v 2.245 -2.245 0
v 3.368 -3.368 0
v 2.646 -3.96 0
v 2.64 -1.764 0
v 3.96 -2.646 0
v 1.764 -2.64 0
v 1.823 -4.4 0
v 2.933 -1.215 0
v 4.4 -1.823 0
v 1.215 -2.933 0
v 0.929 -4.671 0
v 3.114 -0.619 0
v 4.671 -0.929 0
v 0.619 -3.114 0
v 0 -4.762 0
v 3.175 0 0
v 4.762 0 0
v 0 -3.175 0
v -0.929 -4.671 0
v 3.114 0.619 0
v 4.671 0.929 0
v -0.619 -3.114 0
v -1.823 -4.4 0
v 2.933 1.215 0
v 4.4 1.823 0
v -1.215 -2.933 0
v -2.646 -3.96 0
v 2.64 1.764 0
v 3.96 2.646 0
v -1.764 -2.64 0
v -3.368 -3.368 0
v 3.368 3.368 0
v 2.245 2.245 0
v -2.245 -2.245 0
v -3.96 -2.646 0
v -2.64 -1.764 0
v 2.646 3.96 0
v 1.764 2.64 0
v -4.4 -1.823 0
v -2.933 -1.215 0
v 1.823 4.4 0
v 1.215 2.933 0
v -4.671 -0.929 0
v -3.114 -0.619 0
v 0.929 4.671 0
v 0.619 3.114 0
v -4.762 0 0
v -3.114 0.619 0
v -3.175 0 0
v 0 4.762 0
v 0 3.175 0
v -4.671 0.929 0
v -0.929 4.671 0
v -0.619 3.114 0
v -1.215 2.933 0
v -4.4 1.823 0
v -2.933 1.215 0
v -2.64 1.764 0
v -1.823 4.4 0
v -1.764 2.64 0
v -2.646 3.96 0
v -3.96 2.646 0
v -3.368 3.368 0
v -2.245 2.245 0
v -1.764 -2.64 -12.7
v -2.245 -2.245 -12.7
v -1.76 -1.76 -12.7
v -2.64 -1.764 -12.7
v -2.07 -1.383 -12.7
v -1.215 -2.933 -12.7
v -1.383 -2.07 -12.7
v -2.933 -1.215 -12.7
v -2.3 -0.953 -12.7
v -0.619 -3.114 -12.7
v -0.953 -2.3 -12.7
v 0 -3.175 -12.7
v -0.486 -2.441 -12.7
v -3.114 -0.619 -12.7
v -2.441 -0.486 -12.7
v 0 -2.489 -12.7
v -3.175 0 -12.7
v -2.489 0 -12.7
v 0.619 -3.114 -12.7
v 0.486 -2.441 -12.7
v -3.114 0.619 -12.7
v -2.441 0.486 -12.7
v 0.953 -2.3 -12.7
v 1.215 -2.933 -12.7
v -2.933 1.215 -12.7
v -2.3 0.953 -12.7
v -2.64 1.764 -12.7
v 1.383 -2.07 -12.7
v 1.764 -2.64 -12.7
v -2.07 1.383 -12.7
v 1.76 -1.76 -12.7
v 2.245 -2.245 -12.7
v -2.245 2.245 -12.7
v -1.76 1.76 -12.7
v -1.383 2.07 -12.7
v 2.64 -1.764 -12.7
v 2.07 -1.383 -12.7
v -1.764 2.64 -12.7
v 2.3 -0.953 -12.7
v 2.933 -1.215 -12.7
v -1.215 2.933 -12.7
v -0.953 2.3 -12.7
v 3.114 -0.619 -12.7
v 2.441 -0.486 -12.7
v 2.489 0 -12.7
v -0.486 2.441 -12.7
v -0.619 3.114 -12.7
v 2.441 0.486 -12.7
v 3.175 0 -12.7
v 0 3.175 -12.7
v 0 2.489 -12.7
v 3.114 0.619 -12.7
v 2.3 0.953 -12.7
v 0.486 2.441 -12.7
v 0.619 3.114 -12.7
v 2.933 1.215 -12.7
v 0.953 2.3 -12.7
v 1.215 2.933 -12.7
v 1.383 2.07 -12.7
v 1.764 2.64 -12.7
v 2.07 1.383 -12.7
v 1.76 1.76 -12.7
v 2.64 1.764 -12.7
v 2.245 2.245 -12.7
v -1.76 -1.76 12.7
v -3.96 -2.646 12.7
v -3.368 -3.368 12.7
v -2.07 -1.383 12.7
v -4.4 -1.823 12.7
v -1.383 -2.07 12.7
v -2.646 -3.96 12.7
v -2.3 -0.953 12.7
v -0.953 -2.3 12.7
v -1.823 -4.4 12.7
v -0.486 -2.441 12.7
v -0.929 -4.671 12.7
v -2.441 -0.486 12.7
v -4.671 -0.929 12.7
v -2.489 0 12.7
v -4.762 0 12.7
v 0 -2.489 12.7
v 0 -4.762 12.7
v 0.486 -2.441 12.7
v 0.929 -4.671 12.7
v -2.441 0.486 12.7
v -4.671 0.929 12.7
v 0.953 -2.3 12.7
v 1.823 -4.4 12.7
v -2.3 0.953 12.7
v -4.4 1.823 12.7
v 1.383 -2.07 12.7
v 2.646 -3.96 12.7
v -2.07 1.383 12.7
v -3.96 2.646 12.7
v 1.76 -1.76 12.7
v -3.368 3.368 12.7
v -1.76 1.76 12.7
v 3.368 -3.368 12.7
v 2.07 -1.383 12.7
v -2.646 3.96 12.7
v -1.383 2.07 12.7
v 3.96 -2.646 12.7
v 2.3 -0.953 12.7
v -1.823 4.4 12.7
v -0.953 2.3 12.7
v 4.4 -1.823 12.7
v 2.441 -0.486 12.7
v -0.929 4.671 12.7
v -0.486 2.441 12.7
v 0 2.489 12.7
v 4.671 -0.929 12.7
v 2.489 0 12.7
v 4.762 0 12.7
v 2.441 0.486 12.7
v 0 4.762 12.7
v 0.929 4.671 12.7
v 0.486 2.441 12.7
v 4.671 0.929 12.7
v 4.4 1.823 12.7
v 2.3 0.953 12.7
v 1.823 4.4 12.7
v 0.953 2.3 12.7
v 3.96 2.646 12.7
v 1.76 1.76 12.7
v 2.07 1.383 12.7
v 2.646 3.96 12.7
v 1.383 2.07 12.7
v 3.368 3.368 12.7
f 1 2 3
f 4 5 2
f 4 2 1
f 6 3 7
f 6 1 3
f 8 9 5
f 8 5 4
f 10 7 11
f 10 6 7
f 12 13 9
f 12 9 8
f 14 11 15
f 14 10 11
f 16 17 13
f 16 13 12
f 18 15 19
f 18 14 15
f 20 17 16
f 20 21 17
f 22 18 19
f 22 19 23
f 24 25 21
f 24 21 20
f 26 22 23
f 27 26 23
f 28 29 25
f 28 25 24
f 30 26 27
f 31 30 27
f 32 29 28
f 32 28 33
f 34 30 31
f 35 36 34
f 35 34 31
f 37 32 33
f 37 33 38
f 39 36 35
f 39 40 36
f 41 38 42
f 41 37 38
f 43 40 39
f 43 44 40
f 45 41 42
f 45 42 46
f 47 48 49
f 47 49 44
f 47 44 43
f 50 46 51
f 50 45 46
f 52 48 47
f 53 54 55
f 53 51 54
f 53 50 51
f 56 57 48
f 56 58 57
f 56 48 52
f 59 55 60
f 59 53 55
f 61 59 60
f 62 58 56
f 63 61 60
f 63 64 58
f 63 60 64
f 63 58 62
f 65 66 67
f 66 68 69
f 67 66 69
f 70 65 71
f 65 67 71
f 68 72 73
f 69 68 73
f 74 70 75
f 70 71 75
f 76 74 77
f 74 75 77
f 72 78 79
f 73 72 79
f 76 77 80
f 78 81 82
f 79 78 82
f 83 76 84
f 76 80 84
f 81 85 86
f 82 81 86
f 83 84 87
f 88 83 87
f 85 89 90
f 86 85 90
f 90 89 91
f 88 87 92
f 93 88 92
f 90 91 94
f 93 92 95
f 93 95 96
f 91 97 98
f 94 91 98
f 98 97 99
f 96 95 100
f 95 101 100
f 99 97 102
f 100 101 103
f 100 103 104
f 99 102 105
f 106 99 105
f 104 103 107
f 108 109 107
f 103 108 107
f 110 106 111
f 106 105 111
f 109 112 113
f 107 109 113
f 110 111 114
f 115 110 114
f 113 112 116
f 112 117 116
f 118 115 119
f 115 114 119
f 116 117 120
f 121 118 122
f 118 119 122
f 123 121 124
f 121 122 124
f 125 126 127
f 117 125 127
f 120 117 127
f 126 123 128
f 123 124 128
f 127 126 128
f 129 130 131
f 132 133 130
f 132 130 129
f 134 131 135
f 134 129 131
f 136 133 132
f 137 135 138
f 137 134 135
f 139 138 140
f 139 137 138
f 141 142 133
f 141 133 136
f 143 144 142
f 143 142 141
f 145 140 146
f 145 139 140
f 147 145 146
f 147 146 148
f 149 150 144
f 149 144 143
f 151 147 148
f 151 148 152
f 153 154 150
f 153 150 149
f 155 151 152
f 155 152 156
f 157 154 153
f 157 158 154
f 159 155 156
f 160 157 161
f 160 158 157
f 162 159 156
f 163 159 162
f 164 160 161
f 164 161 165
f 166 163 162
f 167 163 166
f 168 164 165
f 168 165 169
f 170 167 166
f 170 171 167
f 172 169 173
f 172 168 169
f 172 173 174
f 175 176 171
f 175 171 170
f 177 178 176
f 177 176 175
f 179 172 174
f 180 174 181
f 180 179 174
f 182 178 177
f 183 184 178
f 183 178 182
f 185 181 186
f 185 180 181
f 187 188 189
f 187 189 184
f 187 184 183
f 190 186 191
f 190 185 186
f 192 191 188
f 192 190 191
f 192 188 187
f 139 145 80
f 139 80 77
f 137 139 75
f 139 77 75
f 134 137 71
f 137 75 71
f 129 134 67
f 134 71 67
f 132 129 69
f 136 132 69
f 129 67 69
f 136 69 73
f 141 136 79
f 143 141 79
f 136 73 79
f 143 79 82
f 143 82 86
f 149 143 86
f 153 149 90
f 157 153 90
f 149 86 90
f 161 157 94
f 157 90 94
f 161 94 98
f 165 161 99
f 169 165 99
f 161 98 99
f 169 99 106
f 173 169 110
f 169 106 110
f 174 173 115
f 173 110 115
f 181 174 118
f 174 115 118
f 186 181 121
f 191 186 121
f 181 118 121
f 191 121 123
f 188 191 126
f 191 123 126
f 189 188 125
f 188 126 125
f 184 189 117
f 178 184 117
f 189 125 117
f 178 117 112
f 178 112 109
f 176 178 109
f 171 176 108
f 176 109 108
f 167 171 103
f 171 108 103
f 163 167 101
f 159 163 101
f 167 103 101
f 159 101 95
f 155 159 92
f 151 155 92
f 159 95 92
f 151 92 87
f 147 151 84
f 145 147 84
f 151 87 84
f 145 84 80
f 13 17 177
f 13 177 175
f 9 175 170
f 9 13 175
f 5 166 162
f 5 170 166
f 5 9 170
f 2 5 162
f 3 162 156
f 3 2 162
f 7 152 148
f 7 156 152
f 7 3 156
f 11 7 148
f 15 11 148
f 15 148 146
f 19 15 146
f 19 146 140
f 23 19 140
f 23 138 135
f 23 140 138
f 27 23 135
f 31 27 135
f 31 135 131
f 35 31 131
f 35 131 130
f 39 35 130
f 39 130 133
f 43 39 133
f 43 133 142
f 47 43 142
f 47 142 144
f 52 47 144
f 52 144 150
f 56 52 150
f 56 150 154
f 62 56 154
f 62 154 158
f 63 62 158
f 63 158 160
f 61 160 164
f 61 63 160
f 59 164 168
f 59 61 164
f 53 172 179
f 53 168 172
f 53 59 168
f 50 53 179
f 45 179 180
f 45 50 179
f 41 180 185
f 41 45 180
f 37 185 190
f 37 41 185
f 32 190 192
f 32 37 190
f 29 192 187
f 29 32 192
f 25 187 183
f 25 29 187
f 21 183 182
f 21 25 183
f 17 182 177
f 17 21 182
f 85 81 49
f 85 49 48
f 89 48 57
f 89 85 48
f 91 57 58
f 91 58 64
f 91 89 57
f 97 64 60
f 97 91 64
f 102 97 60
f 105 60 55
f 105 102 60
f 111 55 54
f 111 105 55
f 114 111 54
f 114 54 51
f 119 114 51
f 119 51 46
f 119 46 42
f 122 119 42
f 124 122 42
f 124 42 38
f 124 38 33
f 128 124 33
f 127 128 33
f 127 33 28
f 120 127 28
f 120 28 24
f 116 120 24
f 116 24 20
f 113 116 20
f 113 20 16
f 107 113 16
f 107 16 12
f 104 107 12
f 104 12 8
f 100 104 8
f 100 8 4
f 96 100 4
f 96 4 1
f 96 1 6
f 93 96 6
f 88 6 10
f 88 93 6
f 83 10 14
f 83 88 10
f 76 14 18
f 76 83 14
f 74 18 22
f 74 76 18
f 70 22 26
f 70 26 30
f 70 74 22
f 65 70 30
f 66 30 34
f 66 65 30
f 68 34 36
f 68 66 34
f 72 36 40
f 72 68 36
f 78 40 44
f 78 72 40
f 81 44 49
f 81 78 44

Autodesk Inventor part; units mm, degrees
ref_plane "YZ Plane" through (0, 0, 0) normal (1, 0, 0) x (0, 1, 0)
ref_plane "XZ Plane" through (0, 0, 0) normal (0, 1, 0) x (-1, 0, 0)
ref_plane "XY Plane" through (0, 0, 0) normal (0, 0, 1) x (1, 0, 0)
sketch "Sketch1" plane through (0, 0, 0) normal (0, 0, 1) x (1, 0, 0)
  circle A0 centre (0, 0) radius 4.7625
  dimension "d0" = 9.525
extrude "Extrusion1" add sketch "Sketch1" along normal mid plane 25.4
sketch "Sketch3" plane through (0, 0, 12.7) normal (0, 0, 1) x (1, 0, 0)
  circle A0 centre (0, 0) radius 4.7625 projected
hole "Hole1" at (0, 0, 12.7) direction (0, 0, -1) diameter 4.9784 end through all clearance for "Flat Head Machine Screw (82)" size "#10" standard "Ansi Unified Screw Threads"
sketch "Sketch4" plane through (0, 0, -12.7) normal (0, 0, -1) x (-1, 0, 0)
  circle A0 centre (0, 0) radius 3.175
  circle A1 centre (0, 0) radius 4.7625 projected
  dimension "d10" = 6.35
extrude "Extrusion2" cut sketch "Sketch4" against normal blind 12.7
properties part number "EL2-008" material "Aluminum 6061"
